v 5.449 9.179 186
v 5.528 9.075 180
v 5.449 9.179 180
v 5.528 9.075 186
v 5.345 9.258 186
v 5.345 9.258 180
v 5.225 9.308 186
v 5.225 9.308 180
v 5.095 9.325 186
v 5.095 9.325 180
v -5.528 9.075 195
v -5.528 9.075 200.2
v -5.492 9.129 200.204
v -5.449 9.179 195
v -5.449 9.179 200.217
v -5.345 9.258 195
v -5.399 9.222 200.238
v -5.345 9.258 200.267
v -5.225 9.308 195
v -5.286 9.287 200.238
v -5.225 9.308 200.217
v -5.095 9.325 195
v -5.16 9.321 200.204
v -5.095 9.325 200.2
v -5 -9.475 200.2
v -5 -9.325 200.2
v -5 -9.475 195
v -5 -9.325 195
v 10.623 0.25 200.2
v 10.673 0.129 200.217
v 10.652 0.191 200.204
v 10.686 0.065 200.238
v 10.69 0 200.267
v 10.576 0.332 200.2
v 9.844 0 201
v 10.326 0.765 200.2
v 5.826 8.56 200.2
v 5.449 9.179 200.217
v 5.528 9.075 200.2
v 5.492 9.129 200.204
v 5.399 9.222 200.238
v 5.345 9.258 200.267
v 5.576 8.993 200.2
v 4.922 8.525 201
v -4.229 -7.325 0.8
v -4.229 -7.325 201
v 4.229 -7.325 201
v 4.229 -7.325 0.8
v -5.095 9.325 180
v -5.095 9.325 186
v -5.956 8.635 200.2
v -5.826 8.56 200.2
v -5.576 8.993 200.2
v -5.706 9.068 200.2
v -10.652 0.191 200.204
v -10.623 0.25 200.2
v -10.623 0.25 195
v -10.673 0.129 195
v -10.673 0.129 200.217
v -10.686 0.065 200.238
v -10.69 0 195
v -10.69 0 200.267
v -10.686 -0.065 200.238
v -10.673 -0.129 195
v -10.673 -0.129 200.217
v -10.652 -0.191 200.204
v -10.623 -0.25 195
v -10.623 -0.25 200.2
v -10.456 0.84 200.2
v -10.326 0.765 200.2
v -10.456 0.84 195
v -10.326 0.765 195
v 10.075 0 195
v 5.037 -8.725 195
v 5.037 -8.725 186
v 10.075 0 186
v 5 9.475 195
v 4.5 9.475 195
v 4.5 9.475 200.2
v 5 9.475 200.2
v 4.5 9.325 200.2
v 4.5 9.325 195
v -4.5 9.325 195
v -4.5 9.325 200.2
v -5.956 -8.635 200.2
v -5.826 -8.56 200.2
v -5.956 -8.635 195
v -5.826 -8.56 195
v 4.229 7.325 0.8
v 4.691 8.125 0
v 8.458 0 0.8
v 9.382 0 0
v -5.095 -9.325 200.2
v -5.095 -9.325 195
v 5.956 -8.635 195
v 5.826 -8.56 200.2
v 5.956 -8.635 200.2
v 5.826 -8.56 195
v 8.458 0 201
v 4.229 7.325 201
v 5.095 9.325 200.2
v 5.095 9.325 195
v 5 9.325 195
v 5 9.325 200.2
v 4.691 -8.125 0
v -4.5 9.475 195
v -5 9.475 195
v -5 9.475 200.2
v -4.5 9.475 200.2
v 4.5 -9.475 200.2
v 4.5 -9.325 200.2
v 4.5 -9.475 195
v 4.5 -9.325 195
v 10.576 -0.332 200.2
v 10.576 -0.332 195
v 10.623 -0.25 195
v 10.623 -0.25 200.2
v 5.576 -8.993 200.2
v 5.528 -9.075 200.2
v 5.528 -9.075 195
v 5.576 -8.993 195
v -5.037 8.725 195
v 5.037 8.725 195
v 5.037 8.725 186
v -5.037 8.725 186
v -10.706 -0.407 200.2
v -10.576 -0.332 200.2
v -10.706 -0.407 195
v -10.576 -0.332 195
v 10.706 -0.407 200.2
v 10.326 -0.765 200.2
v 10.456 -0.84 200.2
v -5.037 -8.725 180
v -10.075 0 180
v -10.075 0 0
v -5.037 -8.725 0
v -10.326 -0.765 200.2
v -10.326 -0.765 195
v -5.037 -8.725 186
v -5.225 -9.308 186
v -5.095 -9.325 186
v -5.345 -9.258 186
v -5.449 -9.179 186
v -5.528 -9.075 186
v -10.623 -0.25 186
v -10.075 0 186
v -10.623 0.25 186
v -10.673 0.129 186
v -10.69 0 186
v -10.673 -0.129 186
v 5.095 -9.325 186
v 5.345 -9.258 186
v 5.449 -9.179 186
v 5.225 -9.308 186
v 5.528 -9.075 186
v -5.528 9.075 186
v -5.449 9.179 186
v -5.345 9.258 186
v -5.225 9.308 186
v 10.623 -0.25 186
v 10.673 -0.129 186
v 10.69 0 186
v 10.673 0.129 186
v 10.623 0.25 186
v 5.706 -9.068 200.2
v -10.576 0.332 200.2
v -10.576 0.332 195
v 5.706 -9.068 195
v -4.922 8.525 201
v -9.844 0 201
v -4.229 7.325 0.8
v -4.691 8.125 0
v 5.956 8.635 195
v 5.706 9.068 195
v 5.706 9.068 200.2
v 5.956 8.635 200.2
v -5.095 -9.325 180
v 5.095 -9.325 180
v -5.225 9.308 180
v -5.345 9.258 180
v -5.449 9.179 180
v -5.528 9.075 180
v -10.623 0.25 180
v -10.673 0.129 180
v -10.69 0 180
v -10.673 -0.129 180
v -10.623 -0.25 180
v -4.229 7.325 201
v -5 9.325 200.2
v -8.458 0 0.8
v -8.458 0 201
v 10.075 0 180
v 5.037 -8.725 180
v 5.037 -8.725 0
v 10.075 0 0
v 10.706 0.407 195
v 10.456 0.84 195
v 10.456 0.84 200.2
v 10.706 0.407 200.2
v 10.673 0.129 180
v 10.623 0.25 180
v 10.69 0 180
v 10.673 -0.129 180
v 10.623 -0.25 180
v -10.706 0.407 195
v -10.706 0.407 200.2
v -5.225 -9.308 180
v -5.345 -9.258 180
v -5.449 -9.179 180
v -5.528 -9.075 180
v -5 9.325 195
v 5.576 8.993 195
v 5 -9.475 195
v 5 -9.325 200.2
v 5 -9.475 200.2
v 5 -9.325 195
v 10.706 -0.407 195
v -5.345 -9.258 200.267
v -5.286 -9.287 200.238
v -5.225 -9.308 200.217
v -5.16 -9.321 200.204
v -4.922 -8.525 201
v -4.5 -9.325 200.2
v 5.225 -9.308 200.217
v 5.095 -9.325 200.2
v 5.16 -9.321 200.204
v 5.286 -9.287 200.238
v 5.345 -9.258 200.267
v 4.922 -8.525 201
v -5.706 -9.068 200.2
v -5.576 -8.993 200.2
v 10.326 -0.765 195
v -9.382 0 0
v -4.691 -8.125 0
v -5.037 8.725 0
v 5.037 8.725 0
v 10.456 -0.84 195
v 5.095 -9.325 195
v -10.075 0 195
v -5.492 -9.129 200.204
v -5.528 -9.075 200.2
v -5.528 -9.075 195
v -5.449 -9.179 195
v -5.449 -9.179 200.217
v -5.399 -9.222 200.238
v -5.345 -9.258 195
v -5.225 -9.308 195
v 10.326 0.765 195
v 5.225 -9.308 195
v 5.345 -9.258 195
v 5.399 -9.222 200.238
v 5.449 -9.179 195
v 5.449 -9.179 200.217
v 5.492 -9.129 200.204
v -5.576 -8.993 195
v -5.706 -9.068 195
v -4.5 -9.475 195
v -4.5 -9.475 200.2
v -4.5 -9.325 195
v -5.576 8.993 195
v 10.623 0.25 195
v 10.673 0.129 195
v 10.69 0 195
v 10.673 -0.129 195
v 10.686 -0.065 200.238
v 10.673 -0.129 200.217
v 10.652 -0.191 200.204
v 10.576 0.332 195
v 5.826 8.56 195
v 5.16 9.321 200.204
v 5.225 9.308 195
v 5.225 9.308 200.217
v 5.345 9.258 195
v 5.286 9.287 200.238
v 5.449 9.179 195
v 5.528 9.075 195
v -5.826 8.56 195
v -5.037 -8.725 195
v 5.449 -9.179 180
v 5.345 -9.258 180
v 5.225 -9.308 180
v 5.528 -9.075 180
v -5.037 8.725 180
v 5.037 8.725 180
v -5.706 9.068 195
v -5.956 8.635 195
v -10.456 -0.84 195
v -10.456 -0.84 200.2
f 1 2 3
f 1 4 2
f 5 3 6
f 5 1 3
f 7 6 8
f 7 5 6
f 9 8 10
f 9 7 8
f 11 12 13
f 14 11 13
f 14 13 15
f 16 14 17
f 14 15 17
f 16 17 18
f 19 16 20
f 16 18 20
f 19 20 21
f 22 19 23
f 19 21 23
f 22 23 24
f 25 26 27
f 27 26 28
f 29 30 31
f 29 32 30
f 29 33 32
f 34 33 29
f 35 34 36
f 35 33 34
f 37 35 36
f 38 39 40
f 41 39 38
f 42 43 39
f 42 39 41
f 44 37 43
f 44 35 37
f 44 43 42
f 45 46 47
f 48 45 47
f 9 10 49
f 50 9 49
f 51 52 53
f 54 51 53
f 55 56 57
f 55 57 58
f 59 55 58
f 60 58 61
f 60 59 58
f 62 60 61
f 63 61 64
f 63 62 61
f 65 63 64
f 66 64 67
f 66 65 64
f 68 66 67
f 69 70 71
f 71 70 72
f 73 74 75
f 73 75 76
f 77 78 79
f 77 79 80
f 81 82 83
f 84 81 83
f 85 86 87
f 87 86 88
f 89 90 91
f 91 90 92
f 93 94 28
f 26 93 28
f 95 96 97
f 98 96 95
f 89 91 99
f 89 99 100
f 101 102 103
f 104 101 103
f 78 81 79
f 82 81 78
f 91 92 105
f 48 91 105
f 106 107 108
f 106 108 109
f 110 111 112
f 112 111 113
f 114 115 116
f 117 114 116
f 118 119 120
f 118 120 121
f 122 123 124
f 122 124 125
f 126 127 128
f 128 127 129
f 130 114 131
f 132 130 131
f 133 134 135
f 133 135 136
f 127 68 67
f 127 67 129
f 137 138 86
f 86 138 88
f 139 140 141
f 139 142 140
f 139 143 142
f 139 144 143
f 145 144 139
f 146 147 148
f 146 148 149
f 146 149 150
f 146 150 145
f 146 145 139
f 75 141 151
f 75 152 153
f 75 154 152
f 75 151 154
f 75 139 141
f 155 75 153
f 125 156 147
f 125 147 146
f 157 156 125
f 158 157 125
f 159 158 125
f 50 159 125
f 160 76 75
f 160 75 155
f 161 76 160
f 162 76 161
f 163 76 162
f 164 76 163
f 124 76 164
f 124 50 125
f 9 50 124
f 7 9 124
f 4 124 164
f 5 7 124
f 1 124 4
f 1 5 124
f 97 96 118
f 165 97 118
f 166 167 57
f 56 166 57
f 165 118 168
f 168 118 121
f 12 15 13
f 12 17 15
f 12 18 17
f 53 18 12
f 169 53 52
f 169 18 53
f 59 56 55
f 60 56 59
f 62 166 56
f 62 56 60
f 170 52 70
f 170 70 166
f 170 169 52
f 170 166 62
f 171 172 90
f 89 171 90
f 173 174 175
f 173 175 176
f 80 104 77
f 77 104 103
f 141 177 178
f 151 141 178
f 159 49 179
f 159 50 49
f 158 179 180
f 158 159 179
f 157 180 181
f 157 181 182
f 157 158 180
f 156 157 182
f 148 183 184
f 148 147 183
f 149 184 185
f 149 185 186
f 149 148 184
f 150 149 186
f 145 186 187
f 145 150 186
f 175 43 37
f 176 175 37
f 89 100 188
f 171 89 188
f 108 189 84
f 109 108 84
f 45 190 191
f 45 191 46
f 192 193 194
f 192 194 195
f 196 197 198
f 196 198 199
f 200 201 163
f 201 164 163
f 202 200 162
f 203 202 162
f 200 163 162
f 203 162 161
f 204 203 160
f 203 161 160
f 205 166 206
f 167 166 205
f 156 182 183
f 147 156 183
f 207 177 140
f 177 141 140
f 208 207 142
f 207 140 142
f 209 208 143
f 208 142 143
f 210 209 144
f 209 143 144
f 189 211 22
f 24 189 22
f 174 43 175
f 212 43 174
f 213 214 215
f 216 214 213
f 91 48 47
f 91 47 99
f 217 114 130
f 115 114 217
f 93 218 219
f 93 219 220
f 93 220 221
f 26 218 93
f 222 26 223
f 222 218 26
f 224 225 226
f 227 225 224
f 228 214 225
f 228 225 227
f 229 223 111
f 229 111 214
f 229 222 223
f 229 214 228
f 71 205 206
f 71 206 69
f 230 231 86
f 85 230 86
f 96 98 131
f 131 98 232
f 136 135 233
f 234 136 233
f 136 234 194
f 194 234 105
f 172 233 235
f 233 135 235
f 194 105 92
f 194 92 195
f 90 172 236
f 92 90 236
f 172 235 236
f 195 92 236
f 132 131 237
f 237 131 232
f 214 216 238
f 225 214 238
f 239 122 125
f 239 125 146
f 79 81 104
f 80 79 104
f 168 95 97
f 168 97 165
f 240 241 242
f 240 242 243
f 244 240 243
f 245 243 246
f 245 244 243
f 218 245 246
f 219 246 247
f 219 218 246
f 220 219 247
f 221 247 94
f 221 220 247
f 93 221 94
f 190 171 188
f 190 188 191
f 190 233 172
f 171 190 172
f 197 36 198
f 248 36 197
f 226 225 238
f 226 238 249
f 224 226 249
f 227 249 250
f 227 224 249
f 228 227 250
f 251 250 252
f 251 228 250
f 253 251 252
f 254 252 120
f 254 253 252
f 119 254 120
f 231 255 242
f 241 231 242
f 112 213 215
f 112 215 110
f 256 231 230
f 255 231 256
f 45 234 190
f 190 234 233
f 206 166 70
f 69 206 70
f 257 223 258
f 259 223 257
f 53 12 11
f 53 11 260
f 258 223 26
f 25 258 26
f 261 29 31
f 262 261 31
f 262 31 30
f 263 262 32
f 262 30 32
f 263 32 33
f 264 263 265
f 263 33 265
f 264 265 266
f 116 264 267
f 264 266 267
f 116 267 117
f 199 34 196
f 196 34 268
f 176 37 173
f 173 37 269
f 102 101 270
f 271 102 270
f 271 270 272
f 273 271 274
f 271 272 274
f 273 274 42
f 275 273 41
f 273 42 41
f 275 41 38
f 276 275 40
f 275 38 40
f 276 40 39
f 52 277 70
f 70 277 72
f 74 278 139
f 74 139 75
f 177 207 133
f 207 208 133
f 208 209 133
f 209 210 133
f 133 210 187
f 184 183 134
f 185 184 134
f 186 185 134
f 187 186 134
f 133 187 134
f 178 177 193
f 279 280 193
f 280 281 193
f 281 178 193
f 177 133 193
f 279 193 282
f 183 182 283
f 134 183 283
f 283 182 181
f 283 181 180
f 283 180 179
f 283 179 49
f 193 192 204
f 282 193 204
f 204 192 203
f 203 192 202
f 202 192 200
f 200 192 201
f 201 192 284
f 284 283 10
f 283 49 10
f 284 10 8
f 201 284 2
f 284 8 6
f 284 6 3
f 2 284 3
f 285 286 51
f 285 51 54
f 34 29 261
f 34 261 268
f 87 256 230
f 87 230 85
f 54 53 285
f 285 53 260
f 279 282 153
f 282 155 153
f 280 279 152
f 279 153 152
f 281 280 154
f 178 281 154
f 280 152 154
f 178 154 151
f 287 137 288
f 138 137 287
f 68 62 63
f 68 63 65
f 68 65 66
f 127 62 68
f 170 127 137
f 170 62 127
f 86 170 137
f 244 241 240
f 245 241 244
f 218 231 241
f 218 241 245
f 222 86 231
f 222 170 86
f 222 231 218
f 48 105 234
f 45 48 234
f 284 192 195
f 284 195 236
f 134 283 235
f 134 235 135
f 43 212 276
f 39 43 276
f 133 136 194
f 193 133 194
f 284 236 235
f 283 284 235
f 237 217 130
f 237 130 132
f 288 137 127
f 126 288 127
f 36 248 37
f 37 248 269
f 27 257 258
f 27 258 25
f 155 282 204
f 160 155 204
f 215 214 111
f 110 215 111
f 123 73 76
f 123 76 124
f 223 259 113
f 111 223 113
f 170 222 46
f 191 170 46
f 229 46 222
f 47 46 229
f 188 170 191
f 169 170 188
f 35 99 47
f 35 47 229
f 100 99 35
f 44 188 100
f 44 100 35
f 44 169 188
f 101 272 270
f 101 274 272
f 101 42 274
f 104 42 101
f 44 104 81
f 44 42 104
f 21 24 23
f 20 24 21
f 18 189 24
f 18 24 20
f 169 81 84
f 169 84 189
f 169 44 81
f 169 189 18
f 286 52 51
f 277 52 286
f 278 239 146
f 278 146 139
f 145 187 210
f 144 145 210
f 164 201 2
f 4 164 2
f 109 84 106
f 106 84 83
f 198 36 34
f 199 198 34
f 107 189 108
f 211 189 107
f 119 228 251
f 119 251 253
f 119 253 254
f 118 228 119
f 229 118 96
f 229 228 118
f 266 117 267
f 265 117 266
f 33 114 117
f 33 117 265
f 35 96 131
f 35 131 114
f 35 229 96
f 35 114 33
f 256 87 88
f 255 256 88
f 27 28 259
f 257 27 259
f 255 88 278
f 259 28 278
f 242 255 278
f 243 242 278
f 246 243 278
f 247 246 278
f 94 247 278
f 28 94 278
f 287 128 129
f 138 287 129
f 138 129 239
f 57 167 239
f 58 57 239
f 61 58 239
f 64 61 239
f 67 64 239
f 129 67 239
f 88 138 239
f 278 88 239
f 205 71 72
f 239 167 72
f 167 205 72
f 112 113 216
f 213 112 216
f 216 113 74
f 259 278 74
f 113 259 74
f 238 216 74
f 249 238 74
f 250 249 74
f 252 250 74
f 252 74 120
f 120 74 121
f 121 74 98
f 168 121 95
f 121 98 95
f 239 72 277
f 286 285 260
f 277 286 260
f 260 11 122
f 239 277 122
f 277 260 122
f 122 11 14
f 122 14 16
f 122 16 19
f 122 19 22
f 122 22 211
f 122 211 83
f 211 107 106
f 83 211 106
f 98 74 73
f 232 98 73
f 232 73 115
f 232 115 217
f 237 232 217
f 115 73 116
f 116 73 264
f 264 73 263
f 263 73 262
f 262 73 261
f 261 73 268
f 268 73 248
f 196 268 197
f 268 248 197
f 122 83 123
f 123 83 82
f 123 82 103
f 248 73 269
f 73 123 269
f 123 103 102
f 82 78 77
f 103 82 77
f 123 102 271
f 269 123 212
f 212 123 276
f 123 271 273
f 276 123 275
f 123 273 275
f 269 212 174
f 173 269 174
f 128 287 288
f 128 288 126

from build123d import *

# Parameters (mm, degrees)
TUBE_FULL_AF_EXTRUSION_DEPTH    = 201
TUBE_BORE_CUT_DEPTH             = 202.504085463
TUBE_BORE_CUT_DEPTH_BACK        = 202.504085463
T4_LOWER_BODY_RELIEF_START      = -6
T4_LOWER_BODY_RELIEF_DEPTH      = 9
T4_UPPER_BODY_RELIEF_START      = 6
T4_UPPER_BODY_RELIEF_DEPTH      = 180
T4_BOTTOM_END_CHAMFER_SIZE      = 0.8
T4_TUBE_MOUTH_CHAMFER_SIZE      = 0.8
T4_GUIDE_BAND_CORNER_FILLETS_R  = 0.5
T4_STOP_BAND_CORNER_FILLETS_R   = 0.5
T4_GUIDE_BAND_RIB_PROFILE_W     = 0.5
T4_GUIDE_BAND_RIB_PROFILE_H     = 5.2
T4_GUIDE_BAND_RIBS_MASTER_DEPTH = 0.15
T4_GUIDE_BAND_RIB_PATTERN_COUNT = 6


with BuildPart() as part:
    # Tube_Full_AF_Profile → Tube_Full_AF_Extrusion (new body)
    with BuildSketch(Plane.XY):
        Polygon((5.38379126, 9.325), (-5.38379126, 9.325), (-10.76758252, 0), (-5.38379126, -9.325), (5.38379126, -9.325), (10.76758252, 0), align=None)
    extrude(amount=TUBE_FULL_AF_EXTRUSION_DEPTH)

    # Tube_Bore_Profile → Tube_Bore_Cut (cut, two sides: drawn at the far end of the back side and taken through both)
    with BuildSketch(Plane.XY.offset(201).offset(-TUBE_BORE_CUT_DEPTH_BACK)):
        Polygon((8.458181444, 0), (4.229090722, 7.325), (-4.229090722, 7.325), (-8.458181444, 0), (-4.229090722, -7.325), (4.229090722, -7.325), align=None)
    extrude(amount=TUBE_BORE_CUT_DEPTH + TUBE_BORE_CUT_DEPTH_BACK, mode=Mode.SUBTRACT)

    # T4_Lower_Relief_Profile → T4_Lower_Body_Relief (cut)
    with BuildSketch(Plane.XY.offset(201).offset(T4_LOWER_BODY_RELIEF_START)):
        Polygon((10.76758252, 0), (5.38379126, 9.325), (-5.38379126, 9.325), (-10.76758252, 0), (-5.38379126, -9.325), (5.38379126, -9.325), align=None)
        Polygon((10.074762197, 0), (5.037381099, 8.725), (-5.037381099, 8.725), (-10.074762197, 0), (-5.037381099, -8.725), (5.037381099, -8.725), align=None, mode=Mode.SUBTRACT)
    extrude(amount=-T4_LOWER_BODY_RELIEF_DEPTH, mode=Mode.SUBTRACT)

    # T4_Upper_Relief_Profile → T4_Upper_Body_Relief (cut)
    with BuildSketch(Plane.XY.offset(174).offset(T4_UPPER_BODY_RELIEF_START)):
        Polygon((5.38379126, -9.325), (10.76758252, 0), (5.38379126, 9.325), (-5.38379126, 9.325), (-10.76758252, 0), (-5.38379126, -9.325), align=None)
        Polygon((5.037381099, 8.725), (10.074762197, 0), (5.037381099, -8.725), (-5.037381099, -8.725), (-10.074762197, 0), (-5.037381099, 8.725), align=None, mode=Mode.SUBTRACT)
    extrude(amount=-T4_UPPER_BODY_RELIEF_DEPTH, mode=Mode.SUBTRACT)

    # T4_Bottom_End_Chamfer
    t4_bottom_end_chamfer_edges = [part.edges().sort_by_distance(p)[0] for p in [
        (0, 9.325, 201),
        (-8.07568689, 4.6625, 201),
        (-8.07568689, -4.6625, 201),
        (0, -9.325, 201),
        (8.07568689, -4.6625, 201),
        (8.07568689, 4.6625, 201),
    ]]
    chamfer(t4_bottom_end_chamfer_edges, length=T4_BOTTOM_END_CHAMFER_SIZE)

    # T4_Tube_Mouth_Chamfer
    t4_tube_mouth_chamfer_edges = [part.edges().sort_by_distance(p)[0] for p in [
        (6.343636083, 3.6625, 0),
        (6.343636083, -3.6625, 0),
        (0, -7.325, 0),
        (-6.343636083, -3.6625, 0),
        (-6.343636083, 3.6625, 0),
        (0, 7.325, 0),
    ]]
    chamfer(t4_tube_mouth_chamfer_edges, length=T4_TUBE_MOUTH_CHAMFER_SIZE)

    # T4_Guide_Band_Corner_Fillets
    t4_guide_band_corner_fillets_edges = [part.edges().sort_by_distance(p)[0] for p in [
        (10.76758252, 0, 197.6),
        (5.38379126, -9.325, 197.6),
        (-5.38379126, -9.325, 197.6),
        (-10.76758252, 0, 197.6),
        (-5.38379126, 9.325, 197.6),
        (5.38379126, 9.325, 197.6),
    ]]
    fillet(t4_guide_band_corner_fillets_edges, radius=T4_GUIDE_BAND_CORNER_FILLETS_R)

    # T4_Stop_Band_Corner_Fillets
    t4_stop_band_corner_fillets_edges = [part.edges().sort_by_distance(p)[0] for p in [
        (-5.38379126, 9.325, 183),
        (-10.76758252, 0, 183),
        (-5.38379126, -9.325, 183),
        (5.38379126, -9.325, 183),
        (10.76758252, 0, 183),
        (5.38379126, 9.325, 183),
    ]]
    fillet(t4_stop_band_corner_fillets_edges, radius=T4_STOP_BAND_CORNER_FILLETS_R)

    # T4_Guide_Band_Rib_Profile → T4_Guide_Band_Ribs_Master (add)
    with BuildSketch(Plane(origin=(0, 9.325, 0), x_dir=(1, 0, 0), z_dir=(0, 1, 0))):
        with Locations((-4.75, -197.6)):
            Rectangle(T4_GUIDE_BAND_RIB_PROFILE_W, T4_GUIDE_BAND_RIB_PROFILE_H)
        with Locations((4.75, -197.6)):
            Rectangle(T4_GUIDE_BAND_RIB_PROFILE_W, T4_GUIDE_BAND_RIB_PROFILE_H)
    t4_guide_band_ribs_master = extrude(amount=T4_GUIDE_BAND_RIBS_MASTER_DEPTH)

    # T4_Guide_Band_Rib_Pattern: T4_Guide_Band_Ribs_Master ×6 about axis
    t4_guide_band_rib_pattern_axis = Axis((0, 0, -78.876304343), (0, 0, 1))
    for i in range(1, T4_GUIDE_BAND_RIB_PATTERN_COUNT):
        add(t4_guide_band_ribs_master.rotate(t4_guide_band_rib_pattern_axis, i * 360 / T4_GUIDE_BAND_RIB_PATTERN_COUNT))


solid = part.part
